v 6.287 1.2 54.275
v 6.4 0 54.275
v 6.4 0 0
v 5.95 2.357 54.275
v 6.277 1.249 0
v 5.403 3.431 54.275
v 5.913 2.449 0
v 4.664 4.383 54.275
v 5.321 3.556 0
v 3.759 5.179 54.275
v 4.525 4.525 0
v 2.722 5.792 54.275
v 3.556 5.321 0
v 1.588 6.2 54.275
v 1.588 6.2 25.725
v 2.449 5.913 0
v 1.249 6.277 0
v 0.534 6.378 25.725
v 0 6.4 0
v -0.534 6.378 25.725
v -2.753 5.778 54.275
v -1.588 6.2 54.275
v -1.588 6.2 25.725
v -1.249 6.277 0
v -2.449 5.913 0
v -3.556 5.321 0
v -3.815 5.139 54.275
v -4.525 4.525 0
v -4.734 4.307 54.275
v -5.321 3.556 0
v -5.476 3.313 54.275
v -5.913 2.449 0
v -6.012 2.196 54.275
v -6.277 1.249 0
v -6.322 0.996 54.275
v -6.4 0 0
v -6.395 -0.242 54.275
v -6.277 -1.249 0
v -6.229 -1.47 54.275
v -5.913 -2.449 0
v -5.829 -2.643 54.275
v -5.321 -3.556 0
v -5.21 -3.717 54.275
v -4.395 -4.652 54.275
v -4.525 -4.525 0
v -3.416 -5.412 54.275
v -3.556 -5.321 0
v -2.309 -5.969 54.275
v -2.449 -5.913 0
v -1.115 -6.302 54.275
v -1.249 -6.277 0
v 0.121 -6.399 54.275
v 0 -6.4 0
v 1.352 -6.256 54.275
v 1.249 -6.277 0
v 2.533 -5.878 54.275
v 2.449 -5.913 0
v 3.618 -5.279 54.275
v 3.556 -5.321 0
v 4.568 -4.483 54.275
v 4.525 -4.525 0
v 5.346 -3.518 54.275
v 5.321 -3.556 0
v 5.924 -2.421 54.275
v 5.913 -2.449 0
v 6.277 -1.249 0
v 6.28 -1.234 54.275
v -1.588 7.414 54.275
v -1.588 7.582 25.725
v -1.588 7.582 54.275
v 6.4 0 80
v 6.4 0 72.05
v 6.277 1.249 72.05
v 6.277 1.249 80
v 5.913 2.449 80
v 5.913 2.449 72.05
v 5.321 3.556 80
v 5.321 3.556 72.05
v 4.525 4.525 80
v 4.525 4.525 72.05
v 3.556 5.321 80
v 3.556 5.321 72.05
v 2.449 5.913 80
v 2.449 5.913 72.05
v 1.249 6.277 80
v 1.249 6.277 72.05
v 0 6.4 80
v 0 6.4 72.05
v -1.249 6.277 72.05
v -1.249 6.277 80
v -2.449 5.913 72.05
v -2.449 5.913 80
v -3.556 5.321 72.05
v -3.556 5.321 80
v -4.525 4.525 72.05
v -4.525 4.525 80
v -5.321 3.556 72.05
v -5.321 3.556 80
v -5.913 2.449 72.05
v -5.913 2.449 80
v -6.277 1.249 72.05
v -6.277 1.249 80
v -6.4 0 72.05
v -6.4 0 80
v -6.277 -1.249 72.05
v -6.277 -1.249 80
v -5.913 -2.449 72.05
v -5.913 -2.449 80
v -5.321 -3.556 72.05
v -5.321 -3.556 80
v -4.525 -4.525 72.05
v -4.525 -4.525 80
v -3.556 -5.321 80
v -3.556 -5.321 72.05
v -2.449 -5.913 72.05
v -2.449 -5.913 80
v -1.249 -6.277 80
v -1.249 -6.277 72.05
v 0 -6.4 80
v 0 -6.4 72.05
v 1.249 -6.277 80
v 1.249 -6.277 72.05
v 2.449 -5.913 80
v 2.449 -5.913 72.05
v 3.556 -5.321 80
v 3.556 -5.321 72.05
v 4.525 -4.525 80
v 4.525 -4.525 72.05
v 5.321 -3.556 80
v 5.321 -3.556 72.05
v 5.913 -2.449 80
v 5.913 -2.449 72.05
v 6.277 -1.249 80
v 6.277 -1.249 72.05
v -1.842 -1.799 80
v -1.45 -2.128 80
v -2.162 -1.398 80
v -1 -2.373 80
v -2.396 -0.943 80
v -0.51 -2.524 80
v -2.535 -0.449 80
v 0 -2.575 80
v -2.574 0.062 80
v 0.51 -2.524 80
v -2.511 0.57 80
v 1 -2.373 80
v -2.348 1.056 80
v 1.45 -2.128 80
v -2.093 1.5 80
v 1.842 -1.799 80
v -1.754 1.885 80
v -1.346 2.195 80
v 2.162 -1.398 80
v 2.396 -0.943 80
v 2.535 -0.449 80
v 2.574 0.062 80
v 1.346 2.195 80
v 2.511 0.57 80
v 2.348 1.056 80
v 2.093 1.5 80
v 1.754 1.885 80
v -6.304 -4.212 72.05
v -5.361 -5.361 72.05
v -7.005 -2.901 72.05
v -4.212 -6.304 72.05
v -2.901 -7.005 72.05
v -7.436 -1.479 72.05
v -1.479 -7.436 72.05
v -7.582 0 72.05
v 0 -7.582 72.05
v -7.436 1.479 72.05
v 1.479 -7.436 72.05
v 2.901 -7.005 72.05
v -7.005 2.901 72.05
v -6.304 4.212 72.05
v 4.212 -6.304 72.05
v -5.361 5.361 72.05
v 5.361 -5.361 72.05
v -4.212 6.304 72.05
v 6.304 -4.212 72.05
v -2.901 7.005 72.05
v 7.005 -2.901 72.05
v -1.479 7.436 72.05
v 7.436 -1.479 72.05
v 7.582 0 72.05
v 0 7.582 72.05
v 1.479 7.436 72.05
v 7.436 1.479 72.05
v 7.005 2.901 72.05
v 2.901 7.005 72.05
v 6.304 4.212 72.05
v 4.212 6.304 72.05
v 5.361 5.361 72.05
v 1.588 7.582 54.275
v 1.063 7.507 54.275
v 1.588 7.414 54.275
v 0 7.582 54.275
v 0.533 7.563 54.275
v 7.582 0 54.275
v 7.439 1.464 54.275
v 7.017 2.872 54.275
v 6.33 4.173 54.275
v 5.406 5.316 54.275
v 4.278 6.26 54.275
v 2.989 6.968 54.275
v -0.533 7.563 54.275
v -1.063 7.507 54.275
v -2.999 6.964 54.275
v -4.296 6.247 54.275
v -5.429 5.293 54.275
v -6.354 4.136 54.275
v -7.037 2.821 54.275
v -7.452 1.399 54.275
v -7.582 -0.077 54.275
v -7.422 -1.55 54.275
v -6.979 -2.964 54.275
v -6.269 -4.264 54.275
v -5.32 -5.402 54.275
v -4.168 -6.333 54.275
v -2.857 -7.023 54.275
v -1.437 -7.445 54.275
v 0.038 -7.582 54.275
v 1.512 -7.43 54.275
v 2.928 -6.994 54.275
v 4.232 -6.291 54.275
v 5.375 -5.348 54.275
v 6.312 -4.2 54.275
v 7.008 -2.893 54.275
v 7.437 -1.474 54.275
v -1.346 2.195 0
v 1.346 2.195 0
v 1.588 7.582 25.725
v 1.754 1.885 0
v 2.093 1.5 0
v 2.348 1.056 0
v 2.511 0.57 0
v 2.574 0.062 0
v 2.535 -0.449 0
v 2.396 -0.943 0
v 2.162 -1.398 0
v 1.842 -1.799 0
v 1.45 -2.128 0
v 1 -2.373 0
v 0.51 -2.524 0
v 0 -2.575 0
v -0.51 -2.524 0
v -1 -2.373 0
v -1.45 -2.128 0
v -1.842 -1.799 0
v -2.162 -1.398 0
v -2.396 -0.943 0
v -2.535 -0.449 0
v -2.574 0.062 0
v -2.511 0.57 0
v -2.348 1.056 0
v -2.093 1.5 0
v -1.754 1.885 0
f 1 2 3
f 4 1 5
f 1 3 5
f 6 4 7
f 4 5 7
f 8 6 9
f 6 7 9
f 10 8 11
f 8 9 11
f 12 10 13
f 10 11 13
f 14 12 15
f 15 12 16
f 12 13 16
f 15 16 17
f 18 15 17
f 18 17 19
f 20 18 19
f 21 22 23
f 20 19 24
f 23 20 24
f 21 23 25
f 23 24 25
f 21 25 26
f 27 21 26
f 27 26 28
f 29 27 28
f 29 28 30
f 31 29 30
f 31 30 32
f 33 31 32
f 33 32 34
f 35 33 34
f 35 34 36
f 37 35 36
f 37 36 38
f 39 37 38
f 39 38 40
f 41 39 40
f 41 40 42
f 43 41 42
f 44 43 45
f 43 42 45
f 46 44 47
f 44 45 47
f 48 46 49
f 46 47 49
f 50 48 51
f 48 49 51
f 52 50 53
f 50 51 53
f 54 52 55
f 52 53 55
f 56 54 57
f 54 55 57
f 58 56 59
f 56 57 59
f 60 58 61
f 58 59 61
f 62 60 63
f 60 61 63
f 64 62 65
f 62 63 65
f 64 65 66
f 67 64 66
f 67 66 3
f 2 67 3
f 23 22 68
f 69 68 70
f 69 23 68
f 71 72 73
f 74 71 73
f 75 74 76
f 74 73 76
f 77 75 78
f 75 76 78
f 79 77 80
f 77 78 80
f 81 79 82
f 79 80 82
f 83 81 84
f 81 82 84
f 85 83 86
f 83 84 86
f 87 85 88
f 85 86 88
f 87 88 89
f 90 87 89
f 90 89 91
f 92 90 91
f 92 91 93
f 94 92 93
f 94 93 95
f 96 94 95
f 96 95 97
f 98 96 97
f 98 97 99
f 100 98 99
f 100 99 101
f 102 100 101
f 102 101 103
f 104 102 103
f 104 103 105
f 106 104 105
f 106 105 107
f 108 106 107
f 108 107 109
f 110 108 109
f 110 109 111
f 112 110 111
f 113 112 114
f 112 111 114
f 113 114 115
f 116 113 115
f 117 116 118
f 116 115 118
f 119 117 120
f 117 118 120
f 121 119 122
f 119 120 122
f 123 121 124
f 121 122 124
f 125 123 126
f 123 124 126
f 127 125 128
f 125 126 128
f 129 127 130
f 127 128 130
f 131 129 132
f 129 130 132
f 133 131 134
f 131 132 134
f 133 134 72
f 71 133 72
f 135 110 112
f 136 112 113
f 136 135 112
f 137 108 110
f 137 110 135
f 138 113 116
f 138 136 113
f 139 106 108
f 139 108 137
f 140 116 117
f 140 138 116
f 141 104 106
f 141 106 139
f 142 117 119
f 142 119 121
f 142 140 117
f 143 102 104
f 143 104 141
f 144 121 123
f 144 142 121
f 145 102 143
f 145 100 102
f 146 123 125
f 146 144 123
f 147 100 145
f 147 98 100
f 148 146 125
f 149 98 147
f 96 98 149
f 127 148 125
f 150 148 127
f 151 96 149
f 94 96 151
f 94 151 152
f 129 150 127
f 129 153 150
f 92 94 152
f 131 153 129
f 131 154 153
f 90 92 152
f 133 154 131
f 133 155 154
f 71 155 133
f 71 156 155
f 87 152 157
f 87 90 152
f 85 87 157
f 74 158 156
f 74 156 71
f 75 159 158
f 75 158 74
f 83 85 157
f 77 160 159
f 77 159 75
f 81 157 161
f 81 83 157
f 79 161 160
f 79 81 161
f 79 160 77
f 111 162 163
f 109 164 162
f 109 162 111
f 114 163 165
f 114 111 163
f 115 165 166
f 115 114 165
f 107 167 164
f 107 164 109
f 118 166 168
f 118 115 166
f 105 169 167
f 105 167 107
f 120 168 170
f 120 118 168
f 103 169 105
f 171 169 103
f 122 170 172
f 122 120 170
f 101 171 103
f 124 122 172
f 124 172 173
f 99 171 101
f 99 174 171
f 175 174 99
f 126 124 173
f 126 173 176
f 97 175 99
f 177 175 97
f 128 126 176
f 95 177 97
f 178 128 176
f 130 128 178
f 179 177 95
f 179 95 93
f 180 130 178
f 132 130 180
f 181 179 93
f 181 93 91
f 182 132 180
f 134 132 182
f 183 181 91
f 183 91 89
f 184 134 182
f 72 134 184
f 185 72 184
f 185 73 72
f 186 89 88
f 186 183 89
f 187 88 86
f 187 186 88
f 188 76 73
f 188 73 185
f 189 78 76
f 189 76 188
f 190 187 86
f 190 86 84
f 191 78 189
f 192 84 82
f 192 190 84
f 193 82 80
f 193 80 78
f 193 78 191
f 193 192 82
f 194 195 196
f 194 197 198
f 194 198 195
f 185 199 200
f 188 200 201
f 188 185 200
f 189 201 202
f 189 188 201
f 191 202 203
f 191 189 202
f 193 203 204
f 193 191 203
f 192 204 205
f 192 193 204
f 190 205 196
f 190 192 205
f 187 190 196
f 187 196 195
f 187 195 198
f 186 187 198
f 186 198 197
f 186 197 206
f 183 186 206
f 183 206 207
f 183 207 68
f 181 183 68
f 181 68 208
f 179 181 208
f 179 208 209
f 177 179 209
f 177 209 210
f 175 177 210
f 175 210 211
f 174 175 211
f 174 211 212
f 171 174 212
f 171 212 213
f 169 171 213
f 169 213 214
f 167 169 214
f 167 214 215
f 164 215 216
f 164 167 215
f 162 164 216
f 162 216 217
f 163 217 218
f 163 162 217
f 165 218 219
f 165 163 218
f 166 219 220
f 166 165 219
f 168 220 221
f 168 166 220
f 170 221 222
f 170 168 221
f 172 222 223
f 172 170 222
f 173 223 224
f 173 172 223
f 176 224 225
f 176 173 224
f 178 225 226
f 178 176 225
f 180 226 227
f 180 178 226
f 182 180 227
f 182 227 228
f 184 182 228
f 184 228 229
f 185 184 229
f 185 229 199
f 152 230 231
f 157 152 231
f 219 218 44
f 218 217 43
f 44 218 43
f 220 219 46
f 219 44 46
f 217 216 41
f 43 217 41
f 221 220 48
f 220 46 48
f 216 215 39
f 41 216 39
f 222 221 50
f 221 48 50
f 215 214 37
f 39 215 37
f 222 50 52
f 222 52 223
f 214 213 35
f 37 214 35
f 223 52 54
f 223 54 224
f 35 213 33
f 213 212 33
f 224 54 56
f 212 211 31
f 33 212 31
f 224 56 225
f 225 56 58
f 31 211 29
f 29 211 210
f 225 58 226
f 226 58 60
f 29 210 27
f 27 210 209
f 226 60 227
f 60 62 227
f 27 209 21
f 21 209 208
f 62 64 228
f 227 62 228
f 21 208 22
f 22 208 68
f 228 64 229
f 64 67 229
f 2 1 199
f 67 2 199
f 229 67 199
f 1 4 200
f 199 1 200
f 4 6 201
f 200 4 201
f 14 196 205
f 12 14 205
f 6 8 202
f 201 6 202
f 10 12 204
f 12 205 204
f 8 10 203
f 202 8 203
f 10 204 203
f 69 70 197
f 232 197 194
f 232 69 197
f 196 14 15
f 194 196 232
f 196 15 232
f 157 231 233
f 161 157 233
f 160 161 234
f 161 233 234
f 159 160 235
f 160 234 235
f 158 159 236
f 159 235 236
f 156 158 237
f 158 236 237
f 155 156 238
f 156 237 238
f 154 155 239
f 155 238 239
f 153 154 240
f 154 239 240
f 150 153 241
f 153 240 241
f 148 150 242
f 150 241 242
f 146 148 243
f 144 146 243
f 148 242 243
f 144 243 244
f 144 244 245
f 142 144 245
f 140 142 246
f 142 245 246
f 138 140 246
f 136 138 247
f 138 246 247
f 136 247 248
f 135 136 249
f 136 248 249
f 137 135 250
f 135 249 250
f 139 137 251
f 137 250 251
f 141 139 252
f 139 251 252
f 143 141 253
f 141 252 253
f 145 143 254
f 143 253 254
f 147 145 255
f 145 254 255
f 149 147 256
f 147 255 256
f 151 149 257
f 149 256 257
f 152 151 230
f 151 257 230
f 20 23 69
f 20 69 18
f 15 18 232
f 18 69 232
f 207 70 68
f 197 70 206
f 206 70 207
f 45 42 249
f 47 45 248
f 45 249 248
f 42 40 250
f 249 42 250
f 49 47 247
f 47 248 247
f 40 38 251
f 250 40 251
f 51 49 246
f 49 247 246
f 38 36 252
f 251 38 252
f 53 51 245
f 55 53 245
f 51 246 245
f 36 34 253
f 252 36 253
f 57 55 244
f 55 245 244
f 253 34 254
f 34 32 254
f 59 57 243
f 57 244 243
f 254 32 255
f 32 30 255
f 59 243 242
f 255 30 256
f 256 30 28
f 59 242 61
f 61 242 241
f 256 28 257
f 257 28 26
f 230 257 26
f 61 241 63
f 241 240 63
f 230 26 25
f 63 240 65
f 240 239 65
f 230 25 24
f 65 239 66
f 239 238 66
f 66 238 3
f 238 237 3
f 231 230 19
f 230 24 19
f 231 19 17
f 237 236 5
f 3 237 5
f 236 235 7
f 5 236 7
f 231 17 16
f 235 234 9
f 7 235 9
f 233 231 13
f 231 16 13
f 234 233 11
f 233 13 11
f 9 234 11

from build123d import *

# Parameters (mm, degrees)
SKETCH1_R                = 6.4
BOSS_EXTRUDE1_DEPTH      = 80
BOSS_EXTRUDE2_DEPTH      = 14.275
BOSS_EXTRUDE2_DEPTH_BACK = 14.275
SKETCH9_W                = 3.175
SKETCH9_H                = 4
BOSS_EXTRUDE3_START      = -7.9502
SKETCH10_R               = 7.5819
SKETCH10_R_2             = 5
BOSS_EXTRUDE3_DEPTH      = 17.7748


with BuildPart() as part:
    # Sketch1 → Boss-Extrude1 (new body)
    with BuildSketch(Plane.XY):
        Circle(SKETCH1_R)
        with BuildLine():
            Line((-1.34632834, 2.195), (1.34632834, 2.195))
            ThreePointArc((1.34632834, 2.195), (0, -2.575), (-1.34632834, 2.195))
        make_face(mode=Mode.SUBTRACT)
    extrude(amount=BOSS_EXTRUDE1_DEPTH)

    # Sketch9 → Boss-Extrude2 (add, two sides: drawn at the far end of the back side and taken through both)
    with BuildSketch(Plane.XY.offset(40).offset(-BOSS_EXTRUDE2_DEPTH_BACK)):
        with Locations((0, 5.5819)):
            Rectangle(SKETCH9_W, SKETCH9_H)
    extrude(amount=BOSS_EXTRUDE2_DEPTH + BOSS_EXTRUDE2_DEPTH_BACK)

    # Sketch10 → Boss-Extrude3 (add)
    with BuildSketch(Plane.XY.offset(80).offset(BOSS_EXTRUDE3_START)):
        Circle(SKETCH10_R)
        Circle(SKETCH10_R_2, mode=Mode.SUBTRACT)
    extrude(amount=-BOSS_EXTRUDE3_DEPTH)


solid = part.part
